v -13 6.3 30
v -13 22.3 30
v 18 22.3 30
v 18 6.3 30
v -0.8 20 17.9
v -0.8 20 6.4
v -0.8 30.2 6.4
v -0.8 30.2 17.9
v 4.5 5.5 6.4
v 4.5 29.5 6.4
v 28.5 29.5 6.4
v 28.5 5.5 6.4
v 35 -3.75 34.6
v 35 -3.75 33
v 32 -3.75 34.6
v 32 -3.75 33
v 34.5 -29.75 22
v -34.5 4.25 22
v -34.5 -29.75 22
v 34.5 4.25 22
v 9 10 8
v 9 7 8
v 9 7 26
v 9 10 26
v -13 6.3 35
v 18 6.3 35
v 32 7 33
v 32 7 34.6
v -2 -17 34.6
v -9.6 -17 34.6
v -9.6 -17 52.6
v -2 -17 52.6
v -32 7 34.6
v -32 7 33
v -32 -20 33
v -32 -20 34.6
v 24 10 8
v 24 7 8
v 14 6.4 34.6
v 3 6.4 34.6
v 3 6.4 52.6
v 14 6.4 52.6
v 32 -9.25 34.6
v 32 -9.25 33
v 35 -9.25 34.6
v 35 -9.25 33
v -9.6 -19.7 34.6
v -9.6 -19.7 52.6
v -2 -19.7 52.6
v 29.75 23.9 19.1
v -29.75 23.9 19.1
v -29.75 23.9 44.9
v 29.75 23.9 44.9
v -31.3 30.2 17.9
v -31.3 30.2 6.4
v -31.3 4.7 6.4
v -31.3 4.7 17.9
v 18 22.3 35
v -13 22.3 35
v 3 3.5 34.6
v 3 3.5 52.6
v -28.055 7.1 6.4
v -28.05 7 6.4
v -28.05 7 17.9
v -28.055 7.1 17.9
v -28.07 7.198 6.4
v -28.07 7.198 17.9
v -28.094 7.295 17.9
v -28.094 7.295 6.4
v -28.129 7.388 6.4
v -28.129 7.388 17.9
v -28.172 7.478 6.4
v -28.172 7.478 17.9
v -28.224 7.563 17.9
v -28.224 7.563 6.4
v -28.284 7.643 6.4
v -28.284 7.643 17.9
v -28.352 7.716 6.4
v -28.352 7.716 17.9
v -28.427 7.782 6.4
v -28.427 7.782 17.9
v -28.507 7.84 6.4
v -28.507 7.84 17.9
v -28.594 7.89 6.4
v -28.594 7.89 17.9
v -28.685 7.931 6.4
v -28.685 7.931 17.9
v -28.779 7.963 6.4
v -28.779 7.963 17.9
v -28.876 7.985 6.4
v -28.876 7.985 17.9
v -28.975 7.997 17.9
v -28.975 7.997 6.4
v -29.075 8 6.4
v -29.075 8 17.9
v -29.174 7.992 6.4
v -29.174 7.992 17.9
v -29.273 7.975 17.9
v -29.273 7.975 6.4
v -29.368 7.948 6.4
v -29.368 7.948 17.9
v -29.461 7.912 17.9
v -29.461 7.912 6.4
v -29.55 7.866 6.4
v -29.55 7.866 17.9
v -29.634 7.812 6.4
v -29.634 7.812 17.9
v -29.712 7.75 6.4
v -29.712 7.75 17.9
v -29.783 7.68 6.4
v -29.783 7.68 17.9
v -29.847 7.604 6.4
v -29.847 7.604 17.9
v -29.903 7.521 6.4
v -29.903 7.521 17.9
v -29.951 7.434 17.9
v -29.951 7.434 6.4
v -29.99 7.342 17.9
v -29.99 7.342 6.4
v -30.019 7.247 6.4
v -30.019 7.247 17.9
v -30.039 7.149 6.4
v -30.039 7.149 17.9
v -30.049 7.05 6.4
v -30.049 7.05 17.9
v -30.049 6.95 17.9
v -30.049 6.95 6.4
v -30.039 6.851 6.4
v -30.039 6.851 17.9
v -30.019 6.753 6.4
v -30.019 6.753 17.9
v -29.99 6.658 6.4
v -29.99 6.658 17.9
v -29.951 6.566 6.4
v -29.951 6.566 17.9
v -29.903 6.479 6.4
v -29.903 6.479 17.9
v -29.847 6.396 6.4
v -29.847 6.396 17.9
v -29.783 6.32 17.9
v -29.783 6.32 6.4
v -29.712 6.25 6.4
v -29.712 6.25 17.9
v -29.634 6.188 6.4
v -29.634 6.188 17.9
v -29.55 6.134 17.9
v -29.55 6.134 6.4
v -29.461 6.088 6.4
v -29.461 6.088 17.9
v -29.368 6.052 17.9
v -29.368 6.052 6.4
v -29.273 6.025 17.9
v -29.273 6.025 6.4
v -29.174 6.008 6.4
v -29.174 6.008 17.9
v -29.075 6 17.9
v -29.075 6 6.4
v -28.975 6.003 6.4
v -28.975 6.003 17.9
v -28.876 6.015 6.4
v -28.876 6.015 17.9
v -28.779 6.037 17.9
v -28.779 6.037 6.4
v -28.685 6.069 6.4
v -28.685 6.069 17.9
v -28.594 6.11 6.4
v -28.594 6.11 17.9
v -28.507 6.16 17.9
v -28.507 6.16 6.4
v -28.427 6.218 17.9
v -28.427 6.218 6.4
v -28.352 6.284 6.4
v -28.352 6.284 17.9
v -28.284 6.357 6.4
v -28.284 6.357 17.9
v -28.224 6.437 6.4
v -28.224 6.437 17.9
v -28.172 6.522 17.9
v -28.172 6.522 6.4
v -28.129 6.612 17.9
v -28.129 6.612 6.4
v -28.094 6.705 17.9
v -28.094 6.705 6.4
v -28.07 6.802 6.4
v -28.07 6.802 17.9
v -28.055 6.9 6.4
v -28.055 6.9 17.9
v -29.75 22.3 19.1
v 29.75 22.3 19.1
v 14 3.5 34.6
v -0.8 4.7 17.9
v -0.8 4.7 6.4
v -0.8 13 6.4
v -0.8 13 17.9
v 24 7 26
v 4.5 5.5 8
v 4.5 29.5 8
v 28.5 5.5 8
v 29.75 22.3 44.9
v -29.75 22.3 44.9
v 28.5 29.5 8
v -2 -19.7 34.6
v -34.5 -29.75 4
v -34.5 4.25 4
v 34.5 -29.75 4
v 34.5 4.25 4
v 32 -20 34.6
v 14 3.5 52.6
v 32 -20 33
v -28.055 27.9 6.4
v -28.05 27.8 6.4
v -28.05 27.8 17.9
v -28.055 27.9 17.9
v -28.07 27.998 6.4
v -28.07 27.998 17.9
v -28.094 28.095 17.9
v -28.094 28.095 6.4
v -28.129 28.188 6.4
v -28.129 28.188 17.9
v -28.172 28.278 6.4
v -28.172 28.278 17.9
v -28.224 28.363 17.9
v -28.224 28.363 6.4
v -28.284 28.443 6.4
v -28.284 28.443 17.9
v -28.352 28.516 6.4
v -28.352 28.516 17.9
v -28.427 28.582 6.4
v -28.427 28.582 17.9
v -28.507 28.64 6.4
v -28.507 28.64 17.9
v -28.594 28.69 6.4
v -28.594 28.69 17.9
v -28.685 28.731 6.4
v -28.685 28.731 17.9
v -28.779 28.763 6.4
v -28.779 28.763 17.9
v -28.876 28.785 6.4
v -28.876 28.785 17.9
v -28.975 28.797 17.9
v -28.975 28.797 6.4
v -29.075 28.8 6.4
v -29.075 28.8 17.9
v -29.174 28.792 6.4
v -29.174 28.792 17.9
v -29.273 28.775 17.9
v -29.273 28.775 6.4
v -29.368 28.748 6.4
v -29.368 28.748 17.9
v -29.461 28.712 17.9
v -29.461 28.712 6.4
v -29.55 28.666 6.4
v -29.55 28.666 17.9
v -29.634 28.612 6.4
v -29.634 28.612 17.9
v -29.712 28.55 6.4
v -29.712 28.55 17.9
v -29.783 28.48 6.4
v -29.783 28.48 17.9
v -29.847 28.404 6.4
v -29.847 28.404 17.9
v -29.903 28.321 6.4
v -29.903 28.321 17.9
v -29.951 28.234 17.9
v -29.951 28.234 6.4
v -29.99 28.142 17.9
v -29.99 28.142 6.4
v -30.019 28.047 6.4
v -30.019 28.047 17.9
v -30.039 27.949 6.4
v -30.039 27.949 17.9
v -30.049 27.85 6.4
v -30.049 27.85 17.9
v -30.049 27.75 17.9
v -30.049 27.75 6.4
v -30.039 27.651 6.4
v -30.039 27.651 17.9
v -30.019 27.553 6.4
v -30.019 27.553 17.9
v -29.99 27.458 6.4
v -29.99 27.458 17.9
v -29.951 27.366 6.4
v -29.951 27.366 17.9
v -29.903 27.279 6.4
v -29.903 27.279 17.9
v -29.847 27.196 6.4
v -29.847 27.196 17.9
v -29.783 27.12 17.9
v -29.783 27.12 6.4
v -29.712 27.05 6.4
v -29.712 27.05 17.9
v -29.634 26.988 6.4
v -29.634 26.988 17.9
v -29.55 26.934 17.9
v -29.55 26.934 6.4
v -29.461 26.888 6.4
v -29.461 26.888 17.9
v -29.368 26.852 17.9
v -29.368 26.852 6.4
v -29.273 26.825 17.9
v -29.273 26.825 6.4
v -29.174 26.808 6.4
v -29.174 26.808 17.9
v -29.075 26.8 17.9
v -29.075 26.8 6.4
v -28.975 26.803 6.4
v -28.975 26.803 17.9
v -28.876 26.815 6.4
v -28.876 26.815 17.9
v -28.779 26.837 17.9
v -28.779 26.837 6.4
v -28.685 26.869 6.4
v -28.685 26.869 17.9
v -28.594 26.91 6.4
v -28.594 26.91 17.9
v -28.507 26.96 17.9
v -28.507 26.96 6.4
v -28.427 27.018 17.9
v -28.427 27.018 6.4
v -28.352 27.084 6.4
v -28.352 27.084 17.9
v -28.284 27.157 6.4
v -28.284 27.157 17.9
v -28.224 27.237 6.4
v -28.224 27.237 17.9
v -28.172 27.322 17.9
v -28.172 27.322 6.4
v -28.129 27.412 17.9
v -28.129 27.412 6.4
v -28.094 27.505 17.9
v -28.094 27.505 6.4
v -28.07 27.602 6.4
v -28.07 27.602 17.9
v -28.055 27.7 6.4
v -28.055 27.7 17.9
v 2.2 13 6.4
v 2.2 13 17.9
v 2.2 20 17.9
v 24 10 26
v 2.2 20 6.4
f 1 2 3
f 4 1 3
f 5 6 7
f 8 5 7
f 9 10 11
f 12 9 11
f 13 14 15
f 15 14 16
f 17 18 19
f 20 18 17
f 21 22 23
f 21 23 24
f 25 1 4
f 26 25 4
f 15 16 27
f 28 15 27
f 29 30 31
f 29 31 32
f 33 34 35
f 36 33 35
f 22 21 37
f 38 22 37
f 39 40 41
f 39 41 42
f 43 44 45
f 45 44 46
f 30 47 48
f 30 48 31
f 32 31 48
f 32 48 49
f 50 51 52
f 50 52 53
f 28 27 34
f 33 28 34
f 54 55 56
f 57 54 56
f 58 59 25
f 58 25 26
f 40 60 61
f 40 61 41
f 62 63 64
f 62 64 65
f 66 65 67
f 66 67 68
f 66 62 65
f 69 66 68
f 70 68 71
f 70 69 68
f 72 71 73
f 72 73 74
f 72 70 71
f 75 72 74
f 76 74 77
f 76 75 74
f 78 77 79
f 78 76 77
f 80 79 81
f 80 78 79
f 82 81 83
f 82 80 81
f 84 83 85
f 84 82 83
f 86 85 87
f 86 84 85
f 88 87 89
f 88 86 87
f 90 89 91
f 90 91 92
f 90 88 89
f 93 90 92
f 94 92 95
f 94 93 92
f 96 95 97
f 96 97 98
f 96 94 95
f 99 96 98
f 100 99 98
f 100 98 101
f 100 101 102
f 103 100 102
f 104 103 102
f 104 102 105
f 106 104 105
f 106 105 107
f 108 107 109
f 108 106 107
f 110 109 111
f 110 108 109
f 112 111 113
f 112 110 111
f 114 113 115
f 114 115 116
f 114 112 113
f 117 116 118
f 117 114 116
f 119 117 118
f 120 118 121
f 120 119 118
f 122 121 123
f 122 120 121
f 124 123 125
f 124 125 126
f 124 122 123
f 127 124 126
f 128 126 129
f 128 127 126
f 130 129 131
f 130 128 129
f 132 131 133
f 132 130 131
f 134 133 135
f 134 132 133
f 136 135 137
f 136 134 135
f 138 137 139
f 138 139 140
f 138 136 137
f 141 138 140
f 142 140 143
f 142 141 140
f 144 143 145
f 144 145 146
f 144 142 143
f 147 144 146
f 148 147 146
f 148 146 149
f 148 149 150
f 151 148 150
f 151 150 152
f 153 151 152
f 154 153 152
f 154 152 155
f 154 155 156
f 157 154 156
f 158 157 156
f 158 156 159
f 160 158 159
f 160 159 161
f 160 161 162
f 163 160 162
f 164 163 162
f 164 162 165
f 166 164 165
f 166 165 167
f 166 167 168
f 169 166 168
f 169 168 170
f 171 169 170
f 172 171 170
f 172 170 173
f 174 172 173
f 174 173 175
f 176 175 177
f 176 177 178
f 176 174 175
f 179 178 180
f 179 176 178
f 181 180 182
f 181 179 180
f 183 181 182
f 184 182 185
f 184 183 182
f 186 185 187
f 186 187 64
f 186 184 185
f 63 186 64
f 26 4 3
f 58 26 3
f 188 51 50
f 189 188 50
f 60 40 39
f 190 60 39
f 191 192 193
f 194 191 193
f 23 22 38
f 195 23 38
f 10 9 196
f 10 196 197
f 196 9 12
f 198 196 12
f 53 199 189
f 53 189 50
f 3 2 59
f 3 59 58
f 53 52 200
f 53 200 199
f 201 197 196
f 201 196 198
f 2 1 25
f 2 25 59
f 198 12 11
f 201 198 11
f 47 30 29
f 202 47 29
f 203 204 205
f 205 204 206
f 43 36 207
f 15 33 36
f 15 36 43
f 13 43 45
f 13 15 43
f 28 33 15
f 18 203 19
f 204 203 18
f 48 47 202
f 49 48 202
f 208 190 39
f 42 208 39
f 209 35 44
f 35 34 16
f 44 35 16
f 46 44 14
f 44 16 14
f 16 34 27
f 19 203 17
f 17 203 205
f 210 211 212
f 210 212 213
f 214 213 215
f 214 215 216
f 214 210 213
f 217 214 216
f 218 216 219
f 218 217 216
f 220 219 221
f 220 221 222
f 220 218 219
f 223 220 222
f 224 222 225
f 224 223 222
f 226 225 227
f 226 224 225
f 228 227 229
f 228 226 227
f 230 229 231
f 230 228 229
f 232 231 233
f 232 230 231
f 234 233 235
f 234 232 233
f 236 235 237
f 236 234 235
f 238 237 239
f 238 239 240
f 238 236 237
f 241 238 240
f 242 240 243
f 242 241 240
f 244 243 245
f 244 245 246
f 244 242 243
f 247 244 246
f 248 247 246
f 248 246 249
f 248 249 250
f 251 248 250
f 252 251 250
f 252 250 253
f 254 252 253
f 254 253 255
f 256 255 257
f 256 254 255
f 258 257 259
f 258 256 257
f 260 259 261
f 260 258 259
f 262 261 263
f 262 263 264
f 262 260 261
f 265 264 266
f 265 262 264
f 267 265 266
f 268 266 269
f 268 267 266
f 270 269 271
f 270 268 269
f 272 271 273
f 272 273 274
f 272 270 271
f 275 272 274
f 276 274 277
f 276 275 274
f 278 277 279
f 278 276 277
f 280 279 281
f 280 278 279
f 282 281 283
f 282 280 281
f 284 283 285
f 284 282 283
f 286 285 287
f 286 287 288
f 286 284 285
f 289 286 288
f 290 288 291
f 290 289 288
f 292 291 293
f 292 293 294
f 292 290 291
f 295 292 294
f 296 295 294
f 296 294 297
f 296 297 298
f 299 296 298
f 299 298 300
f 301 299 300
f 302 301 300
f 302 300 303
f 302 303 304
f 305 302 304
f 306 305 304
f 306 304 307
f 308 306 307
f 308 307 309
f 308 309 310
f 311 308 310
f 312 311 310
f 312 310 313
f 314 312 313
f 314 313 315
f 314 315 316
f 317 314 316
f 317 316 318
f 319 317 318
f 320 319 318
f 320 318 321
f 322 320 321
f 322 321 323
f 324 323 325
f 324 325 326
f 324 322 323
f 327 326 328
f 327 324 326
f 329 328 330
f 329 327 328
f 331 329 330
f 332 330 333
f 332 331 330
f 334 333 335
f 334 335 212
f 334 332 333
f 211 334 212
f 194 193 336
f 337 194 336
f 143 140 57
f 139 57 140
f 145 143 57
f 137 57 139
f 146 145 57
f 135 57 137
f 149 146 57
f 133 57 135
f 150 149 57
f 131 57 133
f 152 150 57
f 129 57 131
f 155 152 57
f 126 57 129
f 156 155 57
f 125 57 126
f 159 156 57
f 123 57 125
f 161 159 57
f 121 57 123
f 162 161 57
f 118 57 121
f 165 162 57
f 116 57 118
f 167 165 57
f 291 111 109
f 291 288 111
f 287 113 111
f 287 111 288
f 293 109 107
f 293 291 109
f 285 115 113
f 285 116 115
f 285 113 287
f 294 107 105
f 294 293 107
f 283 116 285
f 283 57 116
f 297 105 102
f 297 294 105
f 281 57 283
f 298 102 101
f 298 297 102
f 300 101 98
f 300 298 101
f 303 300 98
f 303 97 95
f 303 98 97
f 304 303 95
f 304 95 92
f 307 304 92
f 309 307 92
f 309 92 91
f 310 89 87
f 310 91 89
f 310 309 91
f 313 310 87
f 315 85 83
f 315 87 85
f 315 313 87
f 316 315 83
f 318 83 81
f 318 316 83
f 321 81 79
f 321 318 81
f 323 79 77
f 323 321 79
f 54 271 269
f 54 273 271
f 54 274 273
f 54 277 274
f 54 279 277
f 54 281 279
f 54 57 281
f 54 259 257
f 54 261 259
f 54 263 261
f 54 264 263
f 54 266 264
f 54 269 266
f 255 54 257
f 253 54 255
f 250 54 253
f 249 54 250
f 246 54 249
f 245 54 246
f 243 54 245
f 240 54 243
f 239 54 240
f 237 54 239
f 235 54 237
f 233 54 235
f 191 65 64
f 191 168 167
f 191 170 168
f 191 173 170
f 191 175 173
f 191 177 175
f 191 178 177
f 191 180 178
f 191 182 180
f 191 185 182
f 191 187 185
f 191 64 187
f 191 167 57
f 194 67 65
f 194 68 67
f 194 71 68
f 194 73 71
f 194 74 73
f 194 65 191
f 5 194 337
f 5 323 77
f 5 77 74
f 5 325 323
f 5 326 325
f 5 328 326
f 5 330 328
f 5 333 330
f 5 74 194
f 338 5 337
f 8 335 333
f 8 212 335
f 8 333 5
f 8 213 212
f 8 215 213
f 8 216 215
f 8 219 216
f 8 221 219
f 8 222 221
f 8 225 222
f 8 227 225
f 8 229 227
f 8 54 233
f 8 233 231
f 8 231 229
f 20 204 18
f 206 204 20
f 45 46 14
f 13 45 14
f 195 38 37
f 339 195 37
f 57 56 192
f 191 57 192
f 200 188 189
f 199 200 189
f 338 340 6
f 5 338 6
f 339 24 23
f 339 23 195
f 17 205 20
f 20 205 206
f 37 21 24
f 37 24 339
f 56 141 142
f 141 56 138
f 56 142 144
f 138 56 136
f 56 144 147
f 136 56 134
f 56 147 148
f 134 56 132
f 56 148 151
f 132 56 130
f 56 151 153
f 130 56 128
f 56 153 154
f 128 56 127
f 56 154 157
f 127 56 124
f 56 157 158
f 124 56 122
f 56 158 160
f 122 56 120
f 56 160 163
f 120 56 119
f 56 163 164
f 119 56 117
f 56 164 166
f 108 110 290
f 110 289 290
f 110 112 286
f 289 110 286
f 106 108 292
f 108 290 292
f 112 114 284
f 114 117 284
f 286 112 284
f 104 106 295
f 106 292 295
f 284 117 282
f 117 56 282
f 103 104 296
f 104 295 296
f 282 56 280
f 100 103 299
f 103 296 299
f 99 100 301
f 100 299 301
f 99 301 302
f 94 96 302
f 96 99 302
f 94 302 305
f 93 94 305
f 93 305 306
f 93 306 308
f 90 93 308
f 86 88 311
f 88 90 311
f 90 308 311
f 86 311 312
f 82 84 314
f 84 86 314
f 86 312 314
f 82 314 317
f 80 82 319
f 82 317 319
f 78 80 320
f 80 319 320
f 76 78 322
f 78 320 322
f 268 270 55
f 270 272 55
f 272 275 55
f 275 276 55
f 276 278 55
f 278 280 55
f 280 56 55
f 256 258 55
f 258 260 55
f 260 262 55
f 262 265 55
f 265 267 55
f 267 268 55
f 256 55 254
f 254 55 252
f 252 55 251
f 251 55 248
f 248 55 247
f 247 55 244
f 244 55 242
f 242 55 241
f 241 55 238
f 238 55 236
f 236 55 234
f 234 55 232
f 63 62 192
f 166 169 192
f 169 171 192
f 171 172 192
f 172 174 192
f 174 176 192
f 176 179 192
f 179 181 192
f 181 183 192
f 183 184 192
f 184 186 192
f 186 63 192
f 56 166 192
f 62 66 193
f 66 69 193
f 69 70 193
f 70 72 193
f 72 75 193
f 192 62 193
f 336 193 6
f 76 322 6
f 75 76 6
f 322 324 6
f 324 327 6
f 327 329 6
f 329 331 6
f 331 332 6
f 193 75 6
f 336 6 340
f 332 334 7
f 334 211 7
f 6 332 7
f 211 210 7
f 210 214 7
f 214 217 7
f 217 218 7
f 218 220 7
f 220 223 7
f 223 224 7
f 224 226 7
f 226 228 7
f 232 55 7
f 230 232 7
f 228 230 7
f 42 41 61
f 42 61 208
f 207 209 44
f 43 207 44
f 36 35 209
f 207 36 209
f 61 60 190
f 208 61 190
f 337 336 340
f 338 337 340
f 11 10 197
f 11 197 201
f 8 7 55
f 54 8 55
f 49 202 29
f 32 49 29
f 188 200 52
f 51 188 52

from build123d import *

# Parameters (mm, degrees)
BATTERY_START                              = 4
BATTERY_HOLDER_69_X_34_X_18_PROFILE_W      = 69
BATTERY_HOLDER_69_X_34_X_18_PROFILE_H      = 34
BATTERY_HOLDER_69_X_34_X_18_DEPTH          = 18
YBX_START                                  = 6.4
YBX_BOARD_24_X_24_PROFILE_W                = 24
YBX_BOARD_24_X_24_PROFILE_H                = 24
YBX_BOARD_24_X_24_DEPTH                    = 1.6
YBX_START_2                                = 8
YBX_JUMPER_ALLOWANCE_PROFILE_W             = 15
YBX_JUMPER_ALLOWANCE_PROFILE_H             = 3
YBX_JUMPER_ALLOWANCE_DEPTH                 = 18
GNSS_START                                 = 6.4
GNSS_11_5_MM_HIGH_3_MM_PROJECTION_2_R      = 1
GNSS_11_5_MM_HIGH_3_MM_PROJECTION_D2_DEPTH = 11.5
POWER_START                                = 19.1
POWER_BOARD_59_5_X_25_8_PROFILE_W          = 59.5
POWER_BOARD_59_5_X_25_8_PROFILE_H          = 1.6
POWER_BOARD_59_5_X_25_8_DEPTH              = 25.8
POWER_START_2                              = 30
POWER_HORIZONTAL_CONNECTOR_ALLOWANCE_PRO_W = 31
POWER_HORIZONTAL_CONNECTOR_ALLOWANCE_PRO_H = 16
POWER_HORIZONTAL_CONNECTOR_ALLOWANCE_DEPTH = 5
EORA_START                                 = 33
EORA_64_X_27_TOP_PROJECTION_3_X_5_5_DEPTH  = 1.6
EORA_START_2                               = 34.6
EORA_JUMPER_ALLOWANCE_A_PROFILE_W          = 7.6
EORA_JUMPER_ALLOWANCE_A_PROFILE_H          = 2.7
EORA_JUMPER_ALLOWANCE_A_DEPTH              = 18
EORA_JUMPER_ALLOWANCE_B_PROFILE_W          = 11
EORA_JUMPER_ALLOWANCE_B_PROFILE_H          = 2.9
EORA_JUMPER_ALLOWANCE_B_DEPTH              = 18


with BuildPart() as part:
    # Battery holder 69 x 34 x 18 profile → Battery holder 69 x 34 x 18 (new body)
    with BuildSketch(Plane.XY.offset(BATTERY_START)):
        with Locations((0, -12.75)):
            Rectangle(BATTERY_HOLDER_69_X_34_X_18_PROFILE_W, BATTERY_HOLDER_69_X_34_X_18_PROFILE_H)
    extrude(amount=BATTERY_HOLDER_69_X_34_X_18_DEPTH)


with BuildPart() as body_2:
    # YBX board 24 x 24 profile → YBX board 24 x 24 (new body)
    with BuildSketch(Plane.XY.offset(YBX_START)):
        with Locations((16.5, 17.5)):
            Rectangle(YBX_BOARD_24_X_24_PROFILE_W, YBX_BOARD_24_X_24_PROFILE_H)
    extrude(amount=YBX_BOARD_24_X_24_DEPTH)


with BuildPart() as body_3:
    # YBX jumper allowance profile → YBX jumper allowance (new body)
    with BuildSketch(Plane.XY.offset(YBX_START_2)):
        with Locations((16.5, 8.5)):
            Rectangle(YBX_JUMPER_ALLOWANCE_PROFILE_W, YBX_JUMPER_ALLOWANCE_PROFILE_H)
    extrude(amount=YBX_JUMPER_ALLOWANCE_DEPTH)


with BuildPart() as body_4:
    # GNSS 11.5 mm high - 3 mm projection  2 → GNSS 11.5 mm high - 3 mm projection - D2 (new body)
    with BuildSketch(Plane.XY.offset(GNSS_START)):
        Polygon((-31.3, 4.7), (-0.8, 4.7), (-0.8, 13), (2.2, 13), (2.2, 20), (-0.8, 20), (-0.8, 30.2), (-31.3, 30.2), align=None)
        with Locations((-29.05, 7)):
            Circle(GNSS_11_5_MM_HIGH_3_MM_PROJECTION_2_R, mode=Mode.SUBTRACT)
        with Locations((-29.05, 27.8)):
            Circle(GNSS_11_5_MM_HIGH_3_MM_PROJECTION_2_R, mode=Mode.SUBTRACT)
    extrude(amount=GNSS_11_5_MM_HIGH_3_MM_PROJECTION_D2_DEPTH)


with BuildPart() as body_5:
    # Power board 59.5 x 25.8 profile → Power board 59.5 x 25.8 (new body)
    with BuildSketch(Plane.XY.offset(POWER_START)):
        with Locations((0, 23.1)):
            Rectangle(POWER_BOARD_59_5_X_25_8_PROFILE_W, POWER_BOARD_59_5_X_25_8_PROFILE_H)
    extrude(amount=POWER_BOARD_59_5_X_25_8_DEPTH)


with BuildPart() as body_6:
    # Power horizontal connector allowance profile → Power horizontal connector allowance (new body)
    with BuildSketch(Plane.XY.offset(POWER_START_2)):
        with Locations((2.5, 14.3)):
            Rectangle(POWER_HORIZONTAL_CONNECTOR_ALLOWANCE_PRO_W, POWER_HORIZONTAL_CONNECTOR_ALLOWANCE_PRO_H)
    extrude(amount=POWER_HORIZONTAL_CONNECTOR_ALLOWANCE_DEPTH)


with BuildPart() as body_7:
    # EoRa 64 x 27 - top projection 3 x 5.5 profile → EoRa 64 x 27 - top projection 3 x 5.5 (new body)
    with BuildSketch(Plane.XY.offset(EORA_START)):
        Polygon((-32, -20), (32, -20), (32, -9.25), (35, -9.25), (35, -3.75), (32, -3.75), (32, 7), (-32, 7), align=None)
    extrude(amount=EORA_64_X_27_TOP_PROJECTION_3_X_5_5_DEPTH)


with BuildPart() as body_8:
    # EoRa jumper allowance A profile → EoRa jumper allowance A (new body)
    with BuildSketch(Plane.XY.offset(EORA_START_2)):
        with Locations((-5.8, -18.35)):
            Rectangle(EORA_JUMPER_ALLOWANCE_A_PROFILE_W, EORA_JUMPER_ALLOWANCE_A_PROFILE_H)
    extrude(amount=EORA_JUMPER_ALLOWANCE_A_DEPTH)


with BuildPart() as body_9:
    # EoRa jumper allowance B profile → EoRa jumper allowance B (new body)
    with BuildSketch(Plane.XY.offset(EORA_START_2)):
        with Locations((8.5, 4.95)):
            Rectangle(EORA_JUMPER_ALLOWANCE_B_PROFILE_W, EORA_JUMPER_ALLOWANCE_B_PROFILE_H)
    extrude(amount=EORA_JUMPER_ALLOWANCE_B_DEPTH)


solid = Compound([part.part, body_2.part, body_3.part, body_4.part, body_5.part, body_6.part, body_7.part, body_8.part, body_9.part])
